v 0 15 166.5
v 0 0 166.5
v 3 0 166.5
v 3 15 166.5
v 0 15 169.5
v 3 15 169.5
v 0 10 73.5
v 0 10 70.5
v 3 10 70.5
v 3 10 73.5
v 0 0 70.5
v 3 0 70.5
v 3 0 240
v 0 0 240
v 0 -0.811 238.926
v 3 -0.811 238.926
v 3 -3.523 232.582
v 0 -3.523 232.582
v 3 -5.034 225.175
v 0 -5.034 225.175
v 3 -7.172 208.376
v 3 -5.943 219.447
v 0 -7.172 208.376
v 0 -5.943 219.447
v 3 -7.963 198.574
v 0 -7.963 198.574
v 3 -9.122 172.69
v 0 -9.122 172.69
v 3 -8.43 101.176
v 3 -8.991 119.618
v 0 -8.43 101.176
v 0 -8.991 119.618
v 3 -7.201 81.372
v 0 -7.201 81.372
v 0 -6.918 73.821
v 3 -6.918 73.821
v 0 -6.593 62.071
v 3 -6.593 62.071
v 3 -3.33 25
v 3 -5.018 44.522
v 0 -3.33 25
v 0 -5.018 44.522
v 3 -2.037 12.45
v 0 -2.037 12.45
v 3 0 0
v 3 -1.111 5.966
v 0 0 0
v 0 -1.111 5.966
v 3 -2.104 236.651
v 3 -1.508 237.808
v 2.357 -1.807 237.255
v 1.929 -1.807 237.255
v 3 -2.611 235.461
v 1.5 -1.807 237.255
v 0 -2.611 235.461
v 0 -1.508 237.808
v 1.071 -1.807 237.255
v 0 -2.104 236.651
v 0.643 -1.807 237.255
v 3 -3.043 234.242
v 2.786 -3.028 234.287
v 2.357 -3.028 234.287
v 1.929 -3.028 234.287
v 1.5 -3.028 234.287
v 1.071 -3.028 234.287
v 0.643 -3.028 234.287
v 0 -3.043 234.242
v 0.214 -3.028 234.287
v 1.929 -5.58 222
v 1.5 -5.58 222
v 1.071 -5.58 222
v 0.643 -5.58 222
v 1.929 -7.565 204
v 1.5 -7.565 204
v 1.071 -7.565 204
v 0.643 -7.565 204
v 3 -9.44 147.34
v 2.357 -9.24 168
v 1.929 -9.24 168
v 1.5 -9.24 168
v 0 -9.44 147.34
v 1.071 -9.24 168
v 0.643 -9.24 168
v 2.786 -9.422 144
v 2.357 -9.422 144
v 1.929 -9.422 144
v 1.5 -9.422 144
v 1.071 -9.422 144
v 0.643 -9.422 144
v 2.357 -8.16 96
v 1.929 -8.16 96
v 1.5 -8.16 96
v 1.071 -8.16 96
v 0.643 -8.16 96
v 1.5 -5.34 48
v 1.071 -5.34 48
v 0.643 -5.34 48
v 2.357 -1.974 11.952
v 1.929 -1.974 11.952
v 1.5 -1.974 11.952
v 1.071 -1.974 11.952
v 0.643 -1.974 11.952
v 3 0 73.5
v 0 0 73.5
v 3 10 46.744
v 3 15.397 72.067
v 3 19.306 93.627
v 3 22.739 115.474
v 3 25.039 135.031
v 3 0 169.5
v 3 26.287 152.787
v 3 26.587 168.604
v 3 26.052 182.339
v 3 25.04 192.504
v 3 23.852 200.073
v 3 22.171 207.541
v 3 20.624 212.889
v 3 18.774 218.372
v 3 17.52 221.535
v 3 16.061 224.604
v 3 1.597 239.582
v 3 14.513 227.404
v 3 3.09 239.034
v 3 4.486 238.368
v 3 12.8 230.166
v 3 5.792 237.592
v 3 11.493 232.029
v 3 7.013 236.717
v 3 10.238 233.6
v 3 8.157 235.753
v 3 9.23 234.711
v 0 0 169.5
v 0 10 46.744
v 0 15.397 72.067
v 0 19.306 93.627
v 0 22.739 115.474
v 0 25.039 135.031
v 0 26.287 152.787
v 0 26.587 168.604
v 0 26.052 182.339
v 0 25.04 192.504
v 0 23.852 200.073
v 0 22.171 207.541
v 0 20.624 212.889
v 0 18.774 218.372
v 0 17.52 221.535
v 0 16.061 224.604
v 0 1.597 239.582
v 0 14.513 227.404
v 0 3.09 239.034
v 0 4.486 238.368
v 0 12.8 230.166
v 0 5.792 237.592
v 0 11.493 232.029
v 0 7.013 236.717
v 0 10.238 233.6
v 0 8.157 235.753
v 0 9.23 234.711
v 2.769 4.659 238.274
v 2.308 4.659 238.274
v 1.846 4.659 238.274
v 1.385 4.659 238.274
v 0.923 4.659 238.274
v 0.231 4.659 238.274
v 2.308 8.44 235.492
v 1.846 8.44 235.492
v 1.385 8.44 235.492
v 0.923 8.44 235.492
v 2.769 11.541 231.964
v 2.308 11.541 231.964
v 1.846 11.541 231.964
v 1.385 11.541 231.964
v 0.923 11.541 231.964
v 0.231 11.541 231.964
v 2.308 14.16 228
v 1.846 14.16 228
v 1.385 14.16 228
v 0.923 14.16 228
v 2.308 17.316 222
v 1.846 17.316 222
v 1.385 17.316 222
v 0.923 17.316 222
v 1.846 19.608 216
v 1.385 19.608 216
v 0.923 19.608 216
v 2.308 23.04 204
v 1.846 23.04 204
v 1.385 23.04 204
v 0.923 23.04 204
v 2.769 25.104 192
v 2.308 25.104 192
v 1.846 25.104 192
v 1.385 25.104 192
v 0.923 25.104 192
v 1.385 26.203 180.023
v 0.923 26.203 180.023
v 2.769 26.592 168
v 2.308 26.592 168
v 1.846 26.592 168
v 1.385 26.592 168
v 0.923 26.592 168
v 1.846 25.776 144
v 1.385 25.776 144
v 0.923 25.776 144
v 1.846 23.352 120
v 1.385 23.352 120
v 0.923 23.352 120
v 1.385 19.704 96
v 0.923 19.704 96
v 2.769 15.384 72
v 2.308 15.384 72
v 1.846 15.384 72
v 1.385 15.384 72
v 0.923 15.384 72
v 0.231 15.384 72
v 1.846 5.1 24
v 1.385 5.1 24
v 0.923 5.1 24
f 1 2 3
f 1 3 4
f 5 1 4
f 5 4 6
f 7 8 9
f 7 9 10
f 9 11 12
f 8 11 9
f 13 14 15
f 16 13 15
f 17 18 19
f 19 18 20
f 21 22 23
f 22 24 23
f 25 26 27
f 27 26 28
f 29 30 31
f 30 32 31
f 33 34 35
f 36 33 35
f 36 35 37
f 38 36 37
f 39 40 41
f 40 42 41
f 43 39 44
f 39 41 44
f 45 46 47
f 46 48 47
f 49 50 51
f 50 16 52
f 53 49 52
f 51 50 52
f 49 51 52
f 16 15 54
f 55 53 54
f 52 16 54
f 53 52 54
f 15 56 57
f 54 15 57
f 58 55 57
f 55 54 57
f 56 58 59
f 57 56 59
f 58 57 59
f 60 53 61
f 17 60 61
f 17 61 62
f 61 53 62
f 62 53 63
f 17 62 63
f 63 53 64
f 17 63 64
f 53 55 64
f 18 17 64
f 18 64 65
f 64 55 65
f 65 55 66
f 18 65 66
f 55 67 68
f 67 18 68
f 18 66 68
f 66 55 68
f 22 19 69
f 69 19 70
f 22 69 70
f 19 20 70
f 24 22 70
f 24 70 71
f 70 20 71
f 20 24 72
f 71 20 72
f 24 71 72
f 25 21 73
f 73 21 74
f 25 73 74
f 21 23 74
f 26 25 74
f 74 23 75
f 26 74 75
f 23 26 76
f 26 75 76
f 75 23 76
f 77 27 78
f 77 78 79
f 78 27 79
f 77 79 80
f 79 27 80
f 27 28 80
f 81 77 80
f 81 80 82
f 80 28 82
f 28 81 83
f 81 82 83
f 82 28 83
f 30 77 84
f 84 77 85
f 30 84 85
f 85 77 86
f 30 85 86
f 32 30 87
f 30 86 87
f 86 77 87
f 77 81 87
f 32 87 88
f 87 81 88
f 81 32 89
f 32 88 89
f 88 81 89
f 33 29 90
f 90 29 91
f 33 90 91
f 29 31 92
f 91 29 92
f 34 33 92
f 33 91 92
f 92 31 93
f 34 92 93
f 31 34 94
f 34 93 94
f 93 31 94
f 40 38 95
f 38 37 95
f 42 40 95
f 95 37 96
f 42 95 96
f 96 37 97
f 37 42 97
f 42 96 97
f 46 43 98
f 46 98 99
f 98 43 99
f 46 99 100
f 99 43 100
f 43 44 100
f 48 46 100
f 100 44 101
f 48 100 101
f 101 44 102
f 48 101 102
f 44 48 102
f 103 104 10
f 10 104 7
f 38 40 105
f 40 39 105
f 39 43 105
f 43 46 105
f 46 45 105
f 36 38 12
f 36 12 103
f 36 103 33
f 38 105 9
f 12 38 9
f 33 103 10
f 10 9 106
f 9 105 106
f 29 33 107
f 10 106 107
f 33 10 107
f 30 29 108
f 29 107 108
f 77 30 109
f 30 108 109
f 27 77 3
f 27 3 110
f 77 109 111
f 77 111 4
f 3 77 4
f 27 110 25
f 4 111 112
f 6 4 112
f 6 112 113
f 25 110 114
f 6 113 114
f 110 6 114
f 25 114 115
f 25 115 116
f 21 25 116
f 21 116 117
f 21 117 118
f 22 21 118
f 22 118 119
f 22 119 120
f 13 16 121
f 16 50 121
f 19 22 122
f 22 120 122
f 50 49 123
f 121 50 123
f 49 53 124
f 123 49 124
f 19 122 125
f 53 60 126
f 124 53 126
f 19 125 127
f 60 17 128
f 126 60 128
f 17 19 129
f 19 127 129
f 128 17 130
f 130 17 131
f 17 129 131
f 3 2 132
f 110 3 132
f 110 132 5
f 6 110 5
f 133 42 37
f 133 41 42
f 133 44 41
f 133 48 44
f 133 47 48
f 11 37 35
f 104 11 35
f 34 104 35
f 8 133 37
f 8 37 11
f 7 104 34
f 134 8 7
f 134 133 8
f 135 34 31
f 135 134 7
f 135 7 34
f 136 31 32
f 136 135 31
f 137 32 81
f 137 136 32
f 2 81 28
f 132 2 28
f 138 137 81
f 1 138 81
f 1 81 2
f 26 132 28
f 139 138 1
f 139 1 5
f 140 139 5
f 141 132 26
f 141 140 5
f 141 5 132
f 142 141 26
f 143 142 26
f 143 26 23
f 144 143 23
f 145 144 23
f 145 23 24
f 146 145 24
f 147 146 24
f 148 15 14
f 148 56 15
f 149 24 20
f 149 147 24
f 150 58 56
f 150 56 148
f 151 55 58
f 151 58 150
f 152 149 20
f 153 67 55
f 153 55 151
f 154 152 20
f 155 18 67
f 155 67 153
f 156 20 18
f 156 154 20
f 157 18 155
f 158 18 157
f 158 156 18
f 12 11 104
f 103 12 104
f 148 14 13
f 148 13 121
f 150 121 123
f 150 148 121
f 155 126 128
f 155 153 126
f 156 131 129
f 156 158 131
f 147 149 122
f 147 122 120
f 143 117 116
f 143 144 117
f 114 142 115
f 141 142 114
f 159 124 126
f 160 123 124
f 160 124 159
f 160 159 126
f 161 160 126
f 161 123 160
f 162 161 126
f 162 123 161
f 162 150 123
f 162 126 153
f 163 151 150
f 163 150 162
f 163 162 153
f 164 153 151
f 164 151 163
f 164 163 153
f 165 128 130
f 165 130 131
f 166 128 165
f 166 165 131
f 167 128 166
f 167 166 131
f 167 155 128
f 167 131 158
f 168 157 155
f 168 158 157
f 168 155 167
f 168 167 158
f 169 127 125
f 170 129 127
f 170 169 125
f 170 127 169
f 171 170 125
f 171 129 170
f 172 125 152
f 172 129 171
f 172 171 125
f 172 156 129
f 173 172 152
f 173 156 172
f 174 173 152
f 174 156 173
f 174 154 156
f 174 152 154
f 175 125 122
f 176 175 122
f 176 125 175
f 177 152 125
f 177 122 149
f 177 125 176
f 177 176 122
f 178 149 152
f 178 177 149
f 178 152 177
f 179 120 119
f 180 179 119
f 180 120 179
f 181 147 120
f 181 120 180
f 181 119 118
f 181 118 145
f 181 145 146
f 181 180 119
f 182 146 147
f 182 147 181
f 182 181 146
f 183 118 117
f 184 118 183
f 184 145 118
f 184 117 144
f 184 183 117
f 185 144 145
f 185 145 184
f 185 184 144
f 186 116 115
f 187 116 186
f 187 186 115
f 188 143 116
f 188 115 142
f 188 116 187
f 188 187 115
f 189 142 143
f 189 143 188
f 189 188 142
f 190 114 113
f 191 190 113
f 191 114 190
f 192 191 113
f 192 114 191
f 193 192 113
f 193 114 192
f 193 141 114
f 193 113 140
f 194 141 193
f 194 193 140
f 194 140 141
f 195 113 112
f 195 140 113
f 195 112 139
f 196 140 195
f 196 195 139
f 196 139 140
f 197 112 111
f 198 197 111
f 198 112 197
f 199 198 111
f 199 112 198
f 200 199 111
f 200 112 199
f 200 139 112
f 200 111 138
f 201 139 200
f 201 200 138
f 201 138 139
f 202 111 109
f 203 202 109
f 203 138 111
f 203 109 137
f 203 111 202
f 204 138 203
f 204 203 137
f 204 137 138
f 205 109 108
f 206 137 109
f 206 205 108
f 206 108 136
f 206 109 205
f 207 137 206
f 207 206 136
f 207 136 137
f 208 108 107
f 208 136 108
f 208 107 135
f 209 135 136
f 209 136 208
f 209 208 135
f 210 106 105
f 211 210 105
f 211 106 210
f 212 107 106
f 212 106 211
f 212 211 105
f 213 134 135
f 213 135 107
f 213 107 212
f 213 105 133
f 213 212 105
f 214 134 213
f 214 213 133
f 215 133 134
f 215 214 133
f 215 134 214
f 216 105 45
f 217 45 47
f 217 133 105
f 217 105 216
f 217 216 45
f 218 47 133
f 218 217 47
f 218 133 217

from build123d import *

# Parameters (mm, degrees)
EXTRUDE_1_DEPTH     = 3
SKETCH_2_W          = 3
SKETCH_2_H          = 15
SKETCH_2_H_2        = 10
CUT_EXTRUDE_1_DEPTH = 3


with BuildPart() as part:
    # Эскиз1 → Бобышка-Вытянуть1 (new body)
    with BuildSketch(Plane(origin=(0, 0, 0), x_dir=(0, 0, -1), z_dir=(1, 0, 0))):
        with BuildLine():
            add(Edge.make_bspline(
                [(-240, 0), (-238.539586148, 6.885975956), (-231.6119689, 12.33782744), (-222.175332595, 17.412091216), (-214.111867769, 20.343482826), (-204.156129061, 23.263904239), (-188.104616678, 25.89332168), (-168.007150597, 26.960143982), (-143.945589986, 26.026388226), (-119.918298994, 23.567750867), (-95.953760008, 19.758812003), (-71.912657951, 15.561977026), (-48.005978392, 10.220578603), (-23.989791717, 5.171383231), (-8.037469261, 1.523600682), (0, 0)],
                knots=[0, 0, 0, 0, 0.075346011, 0.102327605, 0.127890212, 0.177564304, 0.226024831, 0.321726685, 0.417300323, 0.513304723, 0.609920295, 0.706973803, 0.804635001, 0.902346226, 1, 1, 1, 1], degree=3))
            add(Edge.make_bspline(
                [(-240, 0), (-236.52391179, -2.886637123), (-230.220810861, -4.067786061), (-222.028601874, -5.648779907), (-214.009642515, -6.608514015), (-204.019456847, -7.65058139), (-188.010543644, -8.621004369), (-168.008371033, -9.355028053), (-143.997445941, -9.544655848), (-119.996434598, -9.000571646), (-95.984120714, -8.452313319), (-79.444451482, -6.861549256), (-63.412851028, -6.941357818), (-47.421480018, -5.149296578), (-23.951991061, -3.34616289), (-7.916011456, -1.672238148), (0, 0)],
                knots=[0, 0, 0, 0, 0.053475274, 0.07870931, 0.103753204, 0.153672751, 0.203448049, 0.302856431, 0.40219897, 0.501554025, 0.600954522, 0.700430481, 0.707480416, 0.799996455, 0.899715685, 1, 1, 1, 1], degree=3))
        make_face()
    extrude(amount=EXTRUDE_1_DEPTH)

    # Эскиз2 → Вырез-Вытянуть1 (cut)
    with BuildSketch(Plane.ZY):
        with Locations((168, 7.5)):
            Rectangle(SKETCH_2_W, SKETCH_2_H)
        with Locations((72, 5)):
            Rectangle(SKETCH_2_W, SKETCH_2_H_2)
    extrude(amount=-CUT_EXTRUDE_1_DEPTH, mode=Mode.SUBTRACT)


solid = part.part
